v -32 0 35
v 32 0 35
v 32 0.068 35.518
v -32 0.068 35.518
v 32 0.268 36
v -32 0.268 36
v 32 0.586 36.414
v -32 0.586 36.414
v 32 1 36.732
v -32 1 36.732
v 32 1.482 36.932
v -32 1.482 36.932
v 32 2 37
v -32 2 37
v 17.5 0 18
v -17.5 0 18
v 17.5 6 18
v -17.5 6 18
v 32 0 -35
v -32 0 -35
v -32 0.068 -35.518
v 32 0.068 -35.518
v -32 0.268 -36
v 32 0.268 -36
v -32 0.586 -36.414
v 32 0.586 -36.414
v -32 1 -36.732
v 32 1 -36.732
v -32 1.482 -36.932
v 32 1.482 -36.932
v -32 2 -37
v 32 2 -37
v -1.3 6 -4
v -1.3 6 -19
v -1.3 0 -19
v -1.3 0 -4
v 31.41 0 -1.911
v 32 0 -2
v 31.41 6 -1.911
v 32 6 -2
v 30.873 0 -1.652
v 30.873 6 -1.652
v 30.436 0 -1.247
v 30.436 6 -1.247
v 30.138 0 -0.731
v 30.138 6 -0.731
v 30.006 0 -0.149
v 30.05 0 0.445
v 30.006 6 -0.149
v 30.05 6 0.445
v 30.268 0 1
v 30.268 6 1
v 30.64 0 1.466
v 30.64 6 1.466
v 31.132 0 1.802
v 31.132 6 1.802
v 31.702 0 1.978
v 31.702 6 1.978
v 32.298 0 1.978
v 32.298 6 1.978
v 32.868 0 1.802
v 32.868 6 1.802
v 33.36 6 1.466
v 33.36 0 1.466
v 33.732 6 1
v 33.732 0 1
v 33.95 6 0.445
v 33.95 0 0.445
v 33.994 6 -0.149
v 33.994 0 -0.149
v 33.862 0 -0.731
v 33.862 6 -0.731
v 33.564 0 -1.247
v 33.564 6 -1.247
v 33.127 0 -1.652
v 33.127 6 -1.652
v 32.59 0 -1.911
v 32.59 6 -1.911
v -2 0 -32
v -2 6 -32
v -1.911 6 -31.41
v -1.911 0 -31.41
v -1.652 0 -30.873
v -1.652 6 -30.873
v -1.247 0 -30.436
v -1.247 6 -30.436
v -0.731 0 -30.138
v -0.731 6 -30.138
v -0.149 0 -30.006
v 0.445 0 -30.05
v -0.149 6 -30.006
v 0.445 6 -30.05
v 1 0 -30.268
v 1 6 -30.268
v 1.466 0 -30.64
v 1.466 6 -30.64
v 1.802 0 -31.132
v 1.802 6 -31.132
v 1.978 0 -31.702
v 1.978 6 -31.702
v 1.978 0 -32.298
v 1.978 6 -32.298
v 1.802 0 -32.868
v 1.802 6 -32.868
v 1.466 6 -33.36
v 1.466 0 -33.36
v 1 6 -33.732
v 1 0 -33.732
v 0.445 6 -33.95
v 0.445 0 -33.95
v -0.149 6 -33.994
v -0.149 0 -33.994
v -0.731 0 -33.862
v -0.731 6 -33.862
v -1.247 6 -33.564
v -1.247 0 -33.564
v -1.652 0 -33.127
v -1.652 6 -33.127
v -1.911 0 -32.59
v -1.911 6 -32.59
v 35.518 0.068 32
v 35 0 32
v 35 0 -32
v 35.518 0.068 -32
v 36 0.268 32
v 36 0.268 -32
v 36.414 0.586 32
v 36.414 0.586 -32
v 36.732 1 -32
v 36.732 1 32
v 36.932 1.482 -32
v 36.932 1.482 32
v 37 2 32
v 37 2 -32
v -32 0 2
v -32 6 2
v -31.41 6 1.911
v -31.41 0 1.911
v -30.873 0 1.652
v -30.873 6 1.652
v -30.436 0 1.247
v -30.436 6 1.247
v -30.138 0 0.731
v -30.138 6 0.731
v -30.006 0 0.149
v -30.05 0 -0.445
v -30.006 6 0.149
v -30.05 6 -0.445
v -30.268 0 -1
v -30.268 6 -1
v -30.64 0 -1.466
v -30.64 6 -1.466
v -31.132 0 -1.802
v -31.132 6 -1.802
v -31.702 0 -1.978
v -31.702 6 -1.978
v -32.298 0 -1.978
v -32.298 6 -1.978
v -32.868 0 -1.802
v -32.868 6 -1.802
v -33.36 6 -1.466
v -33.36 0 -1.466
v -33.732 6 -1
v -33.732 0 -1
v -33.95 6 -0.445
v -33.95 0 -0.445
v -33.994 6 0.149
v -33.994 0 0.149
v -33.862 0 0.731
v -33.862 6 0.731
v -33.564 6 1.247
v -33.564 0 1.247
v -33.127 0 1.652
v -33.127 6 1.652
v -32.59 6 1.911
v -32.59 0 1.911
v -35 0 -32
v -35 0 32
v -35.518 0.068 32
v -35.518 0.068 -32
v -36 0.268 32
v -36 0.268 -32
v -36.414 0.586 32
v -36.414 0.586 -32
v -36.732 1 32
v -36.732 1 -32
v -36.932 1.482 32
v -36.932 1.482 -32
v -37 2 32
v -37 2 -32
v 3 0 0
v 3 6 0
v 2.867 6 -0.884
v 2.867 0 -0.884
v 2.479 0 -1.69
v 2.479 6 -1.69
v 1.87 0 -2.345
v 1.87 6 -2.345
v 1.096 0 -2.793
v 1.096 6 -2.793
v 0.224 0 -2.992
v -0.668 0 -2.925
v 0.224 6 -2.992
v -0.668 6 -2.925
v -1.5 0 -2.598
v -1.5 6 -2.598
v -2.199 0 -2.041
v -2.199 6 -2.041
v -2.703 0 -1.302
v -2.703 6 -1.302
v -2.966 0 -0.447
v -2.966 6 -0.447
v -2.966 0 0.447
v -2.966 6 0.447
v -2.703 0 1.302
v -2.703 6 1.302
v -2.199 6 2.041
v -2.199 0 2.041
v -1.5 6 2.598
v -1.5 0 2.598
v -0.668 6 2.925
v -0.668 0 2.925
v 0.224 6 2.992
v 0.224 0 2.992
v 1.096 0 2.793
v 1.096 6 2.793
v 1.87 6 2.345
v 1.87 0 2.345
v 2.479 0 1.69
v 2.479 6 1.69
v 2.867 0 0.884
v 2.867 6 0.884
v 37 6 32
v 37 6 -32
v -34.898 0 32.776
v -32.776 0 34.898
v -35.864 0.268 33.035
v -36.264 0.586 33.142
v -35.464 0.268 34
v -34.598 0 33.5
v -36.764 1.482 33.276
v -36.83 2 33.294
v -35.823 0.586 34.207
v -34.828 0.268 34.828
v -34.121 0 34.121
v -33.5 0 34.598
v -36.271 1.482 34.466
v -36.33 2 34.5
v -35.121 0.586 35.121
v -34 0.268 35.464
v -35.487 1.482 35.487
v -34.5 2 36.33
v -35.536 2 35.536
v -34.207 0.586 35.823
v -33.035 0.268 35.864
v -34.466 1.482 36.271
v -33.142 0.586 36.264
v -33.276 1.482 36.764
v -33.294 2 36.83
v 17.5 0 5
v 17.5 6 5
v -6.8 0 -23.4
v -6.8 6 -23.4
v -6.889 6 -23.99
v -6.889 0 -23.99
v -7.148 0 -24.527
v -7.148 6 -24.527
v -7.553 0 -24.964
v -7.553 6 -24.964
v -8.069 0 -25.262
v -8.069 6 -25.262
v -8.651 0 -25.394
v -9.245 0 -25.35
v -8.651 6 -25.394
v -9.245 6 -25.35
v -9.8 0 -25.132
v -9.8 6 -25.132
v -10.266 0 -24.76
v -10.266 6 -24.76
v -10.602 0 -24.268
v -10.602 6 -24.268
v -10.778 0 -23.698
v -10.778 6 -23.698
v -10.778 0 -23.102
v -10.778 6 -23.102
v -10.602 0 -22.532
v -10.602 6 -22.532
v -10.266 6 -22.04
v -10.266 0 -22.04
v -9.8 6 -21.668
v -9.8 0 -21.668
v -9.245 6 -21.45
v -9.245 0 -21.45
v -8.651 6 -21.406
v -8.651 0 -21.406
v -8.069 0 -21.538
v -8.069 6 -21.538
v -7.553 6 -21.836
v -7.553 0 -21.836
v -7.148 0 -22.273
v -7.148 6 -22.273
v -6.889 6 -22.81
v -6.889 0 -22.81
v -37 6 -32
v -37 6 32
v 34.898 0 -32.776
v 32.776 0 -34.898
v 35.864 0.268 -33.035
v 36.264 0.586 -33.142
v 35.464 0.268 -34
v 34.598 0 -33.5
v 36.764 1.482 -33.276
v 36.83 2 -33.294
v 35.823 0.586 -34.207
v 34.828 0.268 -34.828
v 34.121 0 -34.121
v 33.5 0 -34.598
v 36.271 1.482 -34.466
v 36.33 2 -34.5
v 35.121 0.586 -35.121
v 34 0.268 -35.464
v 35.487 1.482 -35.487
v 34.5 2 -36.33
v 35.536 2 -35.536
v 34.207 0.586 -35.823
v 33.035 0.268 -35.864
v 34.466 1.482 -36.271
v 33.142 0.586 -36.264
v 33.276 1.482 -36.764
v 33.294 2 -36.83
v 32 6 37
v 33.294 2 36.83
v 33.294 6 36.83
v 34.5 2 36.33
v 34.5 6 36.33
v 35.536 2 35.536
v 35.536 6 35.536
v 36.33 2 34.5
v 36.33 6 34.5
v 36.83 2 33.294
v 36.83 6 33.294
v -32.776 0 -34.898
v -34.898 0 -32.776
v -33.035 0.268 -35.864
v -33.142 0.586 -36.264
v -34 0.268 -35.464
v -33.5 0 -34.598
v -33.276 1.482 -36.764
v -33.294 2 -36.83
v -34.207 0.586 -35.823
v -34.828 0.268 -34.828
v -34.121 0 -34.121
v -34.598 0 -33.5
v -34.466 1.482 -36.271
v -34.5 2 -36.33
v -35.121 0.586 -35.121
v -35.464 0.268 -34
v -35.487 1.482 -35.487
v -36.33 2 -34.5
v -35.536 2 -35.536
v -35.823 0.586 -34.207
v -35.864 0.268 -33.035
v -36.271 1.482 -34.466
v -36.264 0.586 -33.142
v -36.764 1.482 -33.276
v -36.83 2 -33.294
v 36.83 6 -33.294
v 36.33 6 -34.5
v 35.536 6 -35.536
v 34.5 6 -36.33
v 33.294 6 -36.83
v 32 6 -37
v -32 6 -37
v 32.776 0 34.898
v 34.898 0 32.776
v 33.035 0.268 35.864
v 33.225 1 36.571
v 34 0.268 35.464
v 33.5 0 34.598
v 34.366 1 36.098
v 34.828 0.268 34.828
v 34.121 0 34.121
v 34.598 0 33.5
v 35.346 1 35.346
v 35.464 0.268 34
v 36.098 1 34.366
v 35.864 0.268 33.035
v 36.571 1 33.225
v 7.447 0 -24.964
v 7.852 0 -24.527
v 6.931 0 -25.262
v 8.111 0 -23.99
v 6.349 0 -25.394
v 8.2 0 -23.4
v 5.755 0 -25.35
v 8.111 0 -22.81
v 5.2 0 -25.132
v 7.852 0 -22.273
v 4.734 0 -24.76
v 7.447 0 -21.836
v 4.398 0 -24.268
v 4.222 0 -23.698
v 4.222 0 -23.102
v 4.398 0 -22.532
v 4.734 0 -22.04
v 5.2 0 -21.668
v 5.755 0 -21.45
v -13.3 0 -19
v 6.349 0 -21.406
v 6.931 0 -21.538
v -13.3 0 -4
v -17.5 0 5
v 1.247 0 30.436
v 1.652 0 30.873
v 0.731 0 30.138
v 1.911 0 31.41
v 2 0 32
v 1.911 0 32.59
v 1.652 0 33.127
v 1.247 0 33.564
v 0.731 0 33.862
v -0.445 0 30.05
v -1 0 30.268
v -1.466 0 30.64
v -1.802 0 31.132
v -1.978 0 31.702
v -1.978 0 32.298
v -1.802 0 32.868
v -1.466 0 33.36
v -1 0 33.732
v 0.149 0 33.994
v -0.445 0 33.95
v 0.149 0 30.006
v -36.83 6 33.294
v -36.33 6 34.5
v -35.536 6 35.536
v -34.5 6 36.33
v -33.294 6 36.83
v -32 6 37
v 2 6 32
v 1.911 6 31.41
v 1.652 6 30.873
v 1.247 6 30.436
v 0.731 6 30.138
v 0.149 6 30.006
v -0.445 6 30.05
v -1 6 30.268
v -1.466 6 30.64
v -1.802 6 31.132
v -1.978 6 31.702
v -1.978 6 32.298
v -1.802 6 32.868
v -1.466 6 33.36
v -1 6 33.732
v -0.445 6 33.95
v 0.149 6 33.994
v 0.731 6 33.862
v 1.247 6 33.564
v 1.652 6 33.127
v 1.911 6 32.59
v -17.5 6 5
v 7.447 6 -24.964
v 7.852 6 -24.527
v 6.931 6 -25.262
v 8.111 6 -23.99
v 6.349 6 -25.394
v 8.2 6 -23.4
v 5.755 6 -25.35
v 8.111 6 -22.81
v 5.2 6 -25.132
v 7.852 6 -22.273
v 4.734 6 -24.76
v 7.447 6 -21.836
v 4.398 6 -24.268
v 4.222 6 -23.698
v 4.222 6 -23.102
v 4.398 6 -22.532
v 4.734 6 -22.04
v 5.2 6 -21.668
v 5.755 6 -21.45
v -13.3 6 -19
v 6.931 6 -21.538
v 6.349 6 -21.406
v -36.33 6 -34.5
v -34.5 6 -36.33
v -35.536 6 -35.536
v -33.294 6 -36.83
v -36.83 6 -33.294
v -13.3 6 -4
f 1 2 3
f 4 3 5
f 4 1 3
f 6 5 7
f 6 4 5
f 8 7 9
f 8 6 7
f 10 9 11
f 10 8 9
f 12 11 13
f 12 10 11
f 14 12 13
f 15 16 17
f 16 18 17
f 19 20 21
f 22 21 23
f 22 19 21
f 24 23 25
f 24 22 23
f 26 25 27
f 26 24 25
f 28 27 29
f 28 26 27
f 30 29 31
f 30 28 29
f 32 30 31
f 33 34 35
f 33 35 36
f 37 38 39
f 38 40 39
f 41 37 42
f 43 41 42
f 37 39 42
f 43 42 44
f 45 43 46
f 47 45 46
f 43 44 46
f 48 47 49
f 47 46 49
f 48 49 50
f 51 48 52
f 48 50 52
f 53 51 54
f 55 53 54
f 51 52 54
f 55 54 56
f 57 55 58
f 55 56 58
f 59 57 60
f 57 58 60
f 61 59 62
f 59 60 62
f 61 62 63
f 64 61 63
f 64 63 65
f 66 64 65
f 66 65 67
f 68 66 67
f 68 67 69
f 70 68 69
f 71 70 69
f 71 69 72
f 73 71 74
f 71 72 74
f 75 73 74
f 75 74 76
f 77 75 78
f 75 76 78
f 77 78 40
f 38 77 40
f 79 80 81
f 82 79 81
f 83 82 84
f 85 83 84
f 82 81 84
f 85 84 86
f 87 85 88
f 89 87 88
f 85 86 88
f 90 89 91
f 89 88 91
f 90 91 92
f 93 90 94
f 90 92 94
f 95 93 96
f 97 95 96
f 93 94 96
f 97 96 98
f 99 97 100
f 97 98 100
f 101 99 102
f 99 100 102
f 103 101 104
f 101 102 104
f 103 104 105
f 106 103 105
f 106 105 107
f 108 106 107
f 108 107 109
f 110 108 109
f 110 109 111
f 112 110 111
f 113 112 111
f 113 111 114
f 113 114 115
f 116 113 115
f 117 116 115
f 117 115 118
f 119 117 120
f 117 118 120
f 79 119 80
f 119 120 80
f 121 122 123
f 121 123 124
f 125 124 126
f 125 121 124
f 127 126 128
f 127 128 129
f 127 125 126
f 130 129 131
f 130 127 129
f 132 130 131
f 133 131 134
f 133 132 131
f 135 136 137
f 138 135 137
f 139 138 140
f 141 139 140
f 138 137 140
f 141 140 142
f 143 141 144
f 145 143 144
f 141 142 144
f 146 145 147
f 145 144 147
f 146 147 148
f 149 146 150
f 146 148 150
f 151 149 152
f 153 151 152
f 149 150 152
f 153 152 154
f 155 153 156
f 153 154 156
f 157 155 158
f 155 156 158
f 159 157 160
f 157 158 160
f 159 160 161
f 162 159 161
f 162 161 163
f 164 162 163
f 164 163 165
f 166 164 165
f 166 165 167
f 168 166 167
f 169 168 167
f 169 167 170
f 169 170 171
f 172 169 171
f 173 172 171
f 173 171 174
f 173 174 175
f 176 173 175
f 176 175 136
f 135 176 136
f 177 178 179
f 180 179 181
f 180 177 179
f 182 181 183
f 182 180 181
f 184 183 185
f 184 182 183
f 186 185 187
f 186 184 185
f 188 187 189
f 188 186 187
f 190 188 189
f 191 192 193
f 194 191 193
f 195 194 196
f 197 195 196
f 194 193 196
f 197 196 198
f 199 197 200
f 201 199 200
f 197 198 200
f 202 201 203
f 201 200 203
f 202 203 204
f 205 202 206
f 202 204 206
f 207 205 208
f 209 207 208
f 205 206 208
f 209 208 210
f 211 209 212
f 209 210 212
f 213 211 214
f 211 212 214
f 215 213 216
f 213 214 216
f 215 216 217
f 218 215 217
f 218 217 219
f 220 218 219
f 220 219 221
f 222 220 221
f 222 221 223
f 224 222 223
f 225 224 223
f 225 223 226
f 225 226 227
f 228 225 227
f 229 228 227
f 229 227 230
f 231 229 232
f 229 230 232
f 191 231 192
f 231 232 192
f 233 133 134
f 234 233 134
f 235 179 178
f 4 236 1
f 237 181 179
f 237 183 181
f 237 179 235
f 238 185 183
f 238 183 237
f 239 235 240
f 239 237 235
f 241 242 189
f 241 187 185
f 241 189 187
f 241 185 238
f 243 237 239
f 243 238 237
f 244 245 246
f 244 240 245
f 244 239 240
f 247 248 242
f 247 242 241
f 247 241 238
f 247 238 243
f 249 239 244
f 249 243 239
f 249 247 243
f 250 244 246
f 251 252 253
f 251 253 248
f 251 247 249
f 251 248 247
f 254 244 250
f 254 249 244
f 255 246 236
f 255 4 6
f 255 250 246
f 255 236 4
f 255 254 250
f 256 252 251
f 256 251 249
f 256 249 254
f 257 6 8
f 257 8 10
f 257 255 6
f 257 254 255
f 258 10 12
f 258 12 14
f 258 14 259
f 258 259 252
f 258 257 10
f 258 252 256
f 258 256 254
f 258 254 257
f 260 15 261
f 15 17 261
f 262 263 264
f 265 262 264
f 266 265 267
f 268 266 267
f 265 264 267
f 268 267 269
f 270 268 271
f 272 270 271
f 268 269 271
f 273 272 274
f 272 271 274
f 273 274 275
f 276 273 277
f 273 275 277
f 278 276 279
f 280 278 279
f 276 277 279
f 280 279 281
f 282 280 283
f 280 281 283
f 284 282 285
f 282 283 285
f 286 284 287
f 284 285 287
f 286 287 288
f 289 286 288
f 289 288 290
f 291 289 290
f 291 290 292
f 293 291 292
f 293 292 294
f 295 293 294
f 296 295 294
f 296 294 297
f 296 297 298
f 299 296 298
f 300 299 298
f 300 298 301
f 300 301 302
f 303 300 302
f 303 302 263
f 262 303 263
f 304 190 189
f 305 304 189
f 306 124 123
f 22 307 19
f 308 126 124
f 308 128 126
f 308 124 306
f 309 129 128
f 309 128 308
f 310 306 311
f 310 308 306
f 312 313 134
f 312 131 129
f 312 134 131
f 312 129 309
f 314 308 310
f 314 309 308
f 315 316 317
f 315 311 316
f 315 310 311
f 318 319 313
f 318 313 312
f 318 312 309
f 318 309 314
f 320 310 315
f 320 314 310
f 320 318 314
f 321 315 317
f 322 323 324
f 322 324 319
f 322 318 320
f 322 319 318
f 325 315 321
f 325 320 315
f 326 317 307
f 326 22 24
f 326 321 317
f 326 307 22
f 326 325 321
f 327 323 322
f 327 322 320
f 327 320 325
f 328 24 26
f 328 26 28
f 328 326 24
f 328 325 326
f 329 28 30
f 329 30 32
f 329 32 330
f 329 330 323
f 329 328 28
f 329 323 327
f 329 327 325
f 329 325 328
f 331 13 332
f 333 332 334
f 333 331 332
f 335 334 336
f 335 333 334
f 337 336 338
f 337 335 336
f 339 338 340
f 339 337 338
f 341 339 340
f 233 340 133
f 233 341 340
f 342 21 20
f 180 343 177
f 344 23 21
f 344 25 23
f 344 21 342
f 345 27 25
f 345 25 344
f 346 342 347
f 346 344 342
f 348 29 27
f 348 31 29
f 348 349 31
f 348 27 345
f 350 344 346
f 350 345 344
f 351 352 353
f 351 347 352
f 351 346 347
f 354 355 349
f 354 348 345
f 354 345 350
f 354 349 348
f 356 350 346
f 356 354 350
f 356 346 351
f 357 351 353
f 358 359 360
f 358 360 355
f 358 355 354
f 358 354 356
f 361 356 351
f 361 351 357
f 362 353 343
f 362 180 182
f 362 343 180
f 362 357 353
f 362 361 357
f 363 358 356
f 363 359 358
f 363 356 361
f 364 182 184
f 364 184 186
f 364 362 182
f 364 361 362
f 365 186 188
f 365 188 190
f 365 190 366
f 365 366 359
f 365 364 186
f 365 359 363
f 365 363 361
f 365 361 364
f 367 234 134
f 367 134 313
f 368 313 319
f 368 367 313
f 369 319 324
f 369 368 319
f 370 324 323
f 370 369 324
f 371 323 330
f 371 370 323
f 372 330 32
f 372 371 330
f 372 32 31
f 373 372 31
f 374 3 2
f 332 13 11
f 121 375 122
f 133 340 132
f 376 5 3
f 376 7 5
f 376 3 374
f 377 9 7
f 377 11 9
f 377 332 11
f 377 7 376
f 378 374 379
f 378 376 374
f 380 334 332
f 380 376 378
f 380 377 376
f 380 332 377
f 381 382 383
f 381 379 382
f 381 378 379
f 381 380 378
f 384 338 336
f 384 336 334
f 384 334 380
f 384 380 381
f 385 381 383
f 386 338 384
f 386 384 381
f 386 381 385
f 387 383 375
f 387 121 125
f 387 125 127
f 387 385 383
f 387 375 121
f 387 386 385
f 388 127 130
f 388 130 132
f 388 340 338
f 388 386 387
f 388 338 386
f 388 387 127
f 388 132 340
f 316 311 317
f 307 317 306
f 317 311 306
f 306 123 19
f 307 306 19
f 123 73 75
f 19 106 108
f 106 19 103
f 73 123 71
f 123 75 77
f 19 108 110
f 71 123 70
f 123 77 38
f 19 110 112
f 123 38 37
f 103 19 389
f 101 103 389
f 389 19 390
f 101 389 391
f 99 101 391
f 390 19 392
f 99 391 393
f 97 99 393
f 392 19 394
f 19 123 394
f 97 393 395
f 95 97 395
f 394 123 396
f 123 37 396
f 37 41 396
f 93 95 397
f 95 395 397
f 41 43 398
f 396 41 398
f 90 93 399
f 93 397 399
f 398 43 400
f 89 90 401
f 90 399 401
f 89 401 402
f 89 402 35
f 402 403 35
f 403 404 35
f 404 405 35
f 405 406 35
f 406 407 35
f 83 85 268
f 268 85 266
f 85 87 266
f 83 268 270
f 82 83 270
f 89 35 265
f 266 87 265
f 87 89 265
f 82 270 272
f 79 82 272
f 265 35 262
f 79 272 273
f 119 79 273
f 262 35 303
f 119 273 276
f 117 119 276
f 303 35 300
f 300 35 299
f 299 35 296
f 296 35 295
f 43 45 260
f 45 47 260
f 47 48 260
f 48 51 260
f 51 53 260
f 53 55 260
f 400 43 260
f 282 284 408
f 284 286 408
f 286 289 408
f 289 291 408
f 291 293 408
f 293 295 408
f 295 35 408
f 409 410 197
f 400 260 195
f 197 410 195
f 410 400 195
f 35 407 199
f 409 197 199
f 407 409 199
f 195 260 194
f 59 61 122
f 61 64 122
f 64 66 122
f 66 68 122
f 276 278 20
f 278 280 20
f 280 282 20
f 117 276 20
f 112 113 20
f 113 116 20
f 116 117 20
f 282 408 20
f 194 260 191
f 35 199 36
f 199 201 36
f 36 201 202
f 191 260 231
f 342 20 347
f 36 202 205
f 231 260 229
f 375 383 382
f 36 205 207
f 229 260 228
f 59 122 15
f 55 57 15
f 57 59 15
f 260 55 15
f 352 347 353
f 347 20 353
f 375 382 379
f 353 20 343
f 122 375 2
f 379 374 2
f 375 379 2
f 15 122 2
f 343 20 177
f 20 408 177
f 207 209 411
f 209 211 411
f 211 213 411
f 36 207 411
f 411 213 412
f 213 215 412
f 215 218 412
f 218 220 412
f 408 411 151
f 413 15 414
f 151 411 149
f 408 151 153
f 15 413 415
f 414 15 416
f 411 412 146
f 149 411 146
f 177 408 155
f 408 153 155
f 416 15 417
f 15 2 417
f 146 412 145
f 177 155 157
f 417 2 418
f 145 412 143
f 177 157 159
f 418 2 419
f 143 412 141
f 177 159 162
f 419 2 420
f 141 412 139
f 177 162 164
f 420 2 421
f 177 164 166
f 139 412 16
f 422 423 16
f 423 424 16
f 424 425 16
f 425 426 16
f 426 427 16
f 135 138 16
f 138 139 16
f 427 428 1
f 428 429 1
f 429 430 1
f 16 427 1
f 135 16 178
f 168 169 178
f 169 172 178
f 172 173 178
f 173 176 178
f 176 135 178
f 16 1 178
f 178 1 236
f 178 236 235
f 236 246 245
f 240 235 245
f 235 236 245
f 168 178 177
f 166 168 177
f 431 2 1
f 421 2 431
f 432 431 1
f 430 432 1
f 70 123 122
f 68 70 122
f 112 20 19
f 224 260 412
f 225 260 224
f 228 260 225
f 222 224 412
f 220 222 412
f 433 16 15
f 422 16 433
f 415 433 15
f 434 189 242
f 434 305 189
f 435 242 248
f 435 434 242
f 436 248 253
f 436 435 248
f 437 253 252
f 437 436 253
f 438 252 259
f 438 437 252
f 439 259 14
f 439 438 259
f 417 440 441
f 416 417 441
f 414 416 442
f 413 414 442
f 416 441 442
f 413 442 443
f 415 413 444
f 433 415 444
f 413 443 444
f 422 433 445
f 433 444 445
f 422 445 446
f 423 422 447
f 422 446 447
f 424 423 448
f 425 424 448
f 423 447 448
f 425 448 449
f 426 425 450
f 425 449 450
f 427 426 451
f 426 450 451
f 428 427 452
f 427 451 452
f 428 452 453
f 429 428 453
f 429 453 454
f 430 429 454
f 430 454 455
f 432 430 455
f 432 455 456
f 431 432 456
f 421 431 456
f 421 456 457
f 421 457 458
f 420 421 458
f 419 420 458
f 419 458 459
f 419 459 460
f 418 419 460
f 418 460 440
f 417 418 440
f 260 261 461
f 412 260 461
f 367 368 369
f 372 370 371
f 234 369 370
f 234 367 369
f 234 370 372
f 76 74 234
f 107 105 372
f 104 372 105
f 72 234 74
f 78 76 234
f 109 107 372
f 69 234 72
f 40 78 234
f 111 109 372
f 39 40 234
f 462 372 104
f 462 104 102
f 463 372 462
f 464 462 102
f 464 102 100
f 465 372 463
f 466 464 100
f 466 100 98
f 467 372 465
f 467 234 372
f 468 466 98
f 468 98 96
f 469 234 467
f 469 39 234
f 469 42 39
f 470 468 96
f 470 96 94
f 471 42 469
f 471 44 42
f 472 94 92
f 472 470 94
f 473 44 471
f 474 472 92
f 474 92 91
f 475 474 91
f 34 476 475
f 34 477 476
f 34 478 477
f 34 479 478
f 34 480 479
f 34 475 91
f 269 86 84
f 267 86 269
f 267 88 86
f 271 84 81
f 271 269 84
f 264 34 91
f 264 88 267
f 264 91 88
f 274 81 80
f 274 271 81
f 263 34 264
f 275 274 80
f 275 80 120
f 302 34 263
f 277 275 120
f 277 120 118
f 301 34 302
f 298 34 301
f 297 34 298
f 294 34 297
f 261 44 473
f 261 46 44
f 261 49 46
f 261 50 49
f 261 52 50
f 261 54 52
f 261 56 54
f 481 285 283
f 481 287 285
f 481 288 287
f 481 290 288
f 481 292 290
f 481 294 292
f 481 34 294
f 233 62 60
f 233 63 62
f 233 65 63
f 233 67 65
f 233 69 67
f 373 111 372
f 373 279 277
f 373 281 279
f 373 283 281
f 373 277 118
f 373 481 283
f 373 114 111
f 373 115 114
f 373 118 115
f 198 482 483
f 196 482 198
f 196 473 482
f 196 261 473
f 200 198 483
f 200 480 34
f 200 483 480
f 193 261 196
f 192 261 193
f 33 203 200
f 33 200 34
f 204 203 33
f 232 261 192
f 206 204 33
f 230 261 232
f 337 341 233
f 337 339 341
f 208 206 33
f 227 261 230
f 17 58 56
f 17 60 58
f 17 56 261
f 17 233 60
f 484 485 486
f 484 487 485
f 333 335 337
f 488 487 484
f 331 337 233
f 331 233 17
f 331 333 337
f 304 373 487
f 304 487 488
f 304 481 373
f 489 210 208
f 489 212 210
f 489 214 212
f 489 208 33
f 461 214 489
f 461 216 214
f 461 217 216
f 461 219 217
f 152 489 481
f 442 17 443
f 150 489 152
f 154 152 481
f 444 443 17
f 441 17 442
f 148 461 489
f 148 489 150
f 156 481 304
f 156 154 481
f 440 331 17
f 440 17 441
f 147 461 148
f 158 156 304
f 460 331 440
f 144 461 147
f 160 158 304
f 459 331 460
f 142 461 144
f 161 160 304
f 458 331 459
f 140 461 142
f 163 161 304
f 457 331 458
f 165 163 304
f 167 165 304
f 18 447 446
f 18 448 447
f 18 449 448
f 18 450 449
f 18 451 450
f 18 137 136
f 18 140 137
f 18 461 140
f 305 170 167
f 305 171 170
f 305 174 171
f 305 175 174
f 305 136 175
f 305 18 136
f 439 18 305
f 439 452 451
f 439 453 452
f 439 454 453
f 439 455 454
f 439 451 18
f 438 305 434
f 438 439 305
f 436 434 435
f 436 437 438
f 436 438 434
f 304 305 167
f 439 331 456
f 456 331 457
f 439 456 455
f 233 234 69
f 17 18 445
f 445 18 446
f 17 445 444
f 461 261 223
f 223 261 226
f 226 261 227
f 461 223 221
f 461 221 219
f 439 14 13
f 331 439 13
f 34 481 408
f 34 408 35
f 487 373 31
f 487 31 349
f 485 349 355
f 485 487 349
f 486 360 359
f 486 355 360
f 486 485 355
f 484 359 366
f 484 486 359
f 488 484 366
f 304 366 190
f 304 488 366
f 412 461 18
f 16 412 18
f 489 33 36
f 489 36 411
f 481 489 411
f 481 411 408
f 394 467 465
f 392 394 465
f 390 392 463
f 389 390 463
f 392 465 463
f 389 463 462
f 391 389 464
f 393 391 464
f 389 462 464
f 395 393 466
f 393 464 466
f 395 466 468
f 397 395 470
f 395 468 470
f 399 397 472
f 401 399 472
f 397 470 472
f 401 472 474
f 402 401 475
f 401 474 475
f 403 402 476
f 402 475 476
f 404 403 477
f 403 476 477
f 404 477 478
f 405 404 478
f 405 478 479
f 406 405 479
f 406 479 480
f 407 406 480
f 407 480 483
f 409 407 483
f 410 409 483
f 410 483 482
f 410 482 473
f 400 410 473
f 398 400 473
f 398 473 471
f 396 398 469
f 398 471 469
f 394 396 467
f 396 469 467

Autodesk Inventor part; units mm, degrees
ref_plane "YZ Plane" through (0, 0, 0) normal (1, 0, 0) x (0, 1, 0)
ref_plane "XZ Plane" through (0, 0, 0) normal (0, 1, 0) x (-1, 0, 0)
ref_plane "XY Plane" through (0, 0, 0) normal (0, 0, 1) x (1, 0, 0)
sketch "Sketch1" plane through (0, 0, 0) normal (0, 1, 0) x (-1, 0, 0)
  line L0 (37, 37) -> (-37, 37)
  line L1 (-37, 37) -> (-37, -37)
  line L2 (-37, -37) -> (37, -37)
  line L3 (37, -37) -> (37, 37)
  point P0 (0, 0)
  dimension "d0" = 74
  dimension "d1" = 74
extrude "Extrusion1" add sketch "Sketch1" along normal blind 6
fillet "Fillet1" radius 5 4 edges at (-37, 3, 37) (37, 3, 37) (37, 3, -37) (-37, 3, -37)
fillet "Fillet2" radius 2 8 edges at (35.5355, 0, 35.5355) (37, 0, 0) (35.5355, 0, -35.5355) (0, 0, -37) (-35.5355, 0, -35.5355) (-37, 0, 0) (-35.5355, 0, 35.5355) (0, 0, 37)
sketch "Sketch6" plane through (0, 6, 0) normal (0, 1, 0) x (1, 0, 0)
  circle A0 centre (0, 0) radius 3
  circle A1 centre (6.2, 23.4) radius 2
  circle A2 centre (-8.8, 23.4) radius 2
  line L0 (-1.3, 4) -> (-13.3, 4)
  line L1 (-13.3, 4) -> (-13.3, 19)
  line L2 (-13.3, 19) -> (-1.3, 19)
  line L3 (-1.3, 19) -> (-1.3, 4)
  line L4 (17.5, -5) -> (-17.5, -5)
  line L5 (-17.5, -5) -> (-17.5, -18)
  line L6 (-17.5, -18) -> (17.5, -18)
  line L7 (17.5, -18) -> (17.5, -5)
  dimension "d29" = 6
  dimension "d30" = 4
  dimension "d31" = 4
  dimension "d32" = 12
  dimension "d33" = 15
  dimension "d34" = 35
  dimension "d35" = 13
extrude "Extrusion6" cut sketch "Sketch6" against normal blind 10
sketch "Sketch7" plane through (0, 6, 0) normal (0, 1, 0) x (1, 0, 0)
  circle A0 centre (0, -32) radius 2
  point P0 (0, 0)
  dimension "d38" = 4
extrude "Extrusion7" cut sketch "Sketch7" against normal blind 10
pattern_circular "Circular Pattern1" count 4 over 360 about axis through (0, -10, 0) along (0, 1, 0) of "Extrusion7"
properties part number "g2ExtruMountPlate"
